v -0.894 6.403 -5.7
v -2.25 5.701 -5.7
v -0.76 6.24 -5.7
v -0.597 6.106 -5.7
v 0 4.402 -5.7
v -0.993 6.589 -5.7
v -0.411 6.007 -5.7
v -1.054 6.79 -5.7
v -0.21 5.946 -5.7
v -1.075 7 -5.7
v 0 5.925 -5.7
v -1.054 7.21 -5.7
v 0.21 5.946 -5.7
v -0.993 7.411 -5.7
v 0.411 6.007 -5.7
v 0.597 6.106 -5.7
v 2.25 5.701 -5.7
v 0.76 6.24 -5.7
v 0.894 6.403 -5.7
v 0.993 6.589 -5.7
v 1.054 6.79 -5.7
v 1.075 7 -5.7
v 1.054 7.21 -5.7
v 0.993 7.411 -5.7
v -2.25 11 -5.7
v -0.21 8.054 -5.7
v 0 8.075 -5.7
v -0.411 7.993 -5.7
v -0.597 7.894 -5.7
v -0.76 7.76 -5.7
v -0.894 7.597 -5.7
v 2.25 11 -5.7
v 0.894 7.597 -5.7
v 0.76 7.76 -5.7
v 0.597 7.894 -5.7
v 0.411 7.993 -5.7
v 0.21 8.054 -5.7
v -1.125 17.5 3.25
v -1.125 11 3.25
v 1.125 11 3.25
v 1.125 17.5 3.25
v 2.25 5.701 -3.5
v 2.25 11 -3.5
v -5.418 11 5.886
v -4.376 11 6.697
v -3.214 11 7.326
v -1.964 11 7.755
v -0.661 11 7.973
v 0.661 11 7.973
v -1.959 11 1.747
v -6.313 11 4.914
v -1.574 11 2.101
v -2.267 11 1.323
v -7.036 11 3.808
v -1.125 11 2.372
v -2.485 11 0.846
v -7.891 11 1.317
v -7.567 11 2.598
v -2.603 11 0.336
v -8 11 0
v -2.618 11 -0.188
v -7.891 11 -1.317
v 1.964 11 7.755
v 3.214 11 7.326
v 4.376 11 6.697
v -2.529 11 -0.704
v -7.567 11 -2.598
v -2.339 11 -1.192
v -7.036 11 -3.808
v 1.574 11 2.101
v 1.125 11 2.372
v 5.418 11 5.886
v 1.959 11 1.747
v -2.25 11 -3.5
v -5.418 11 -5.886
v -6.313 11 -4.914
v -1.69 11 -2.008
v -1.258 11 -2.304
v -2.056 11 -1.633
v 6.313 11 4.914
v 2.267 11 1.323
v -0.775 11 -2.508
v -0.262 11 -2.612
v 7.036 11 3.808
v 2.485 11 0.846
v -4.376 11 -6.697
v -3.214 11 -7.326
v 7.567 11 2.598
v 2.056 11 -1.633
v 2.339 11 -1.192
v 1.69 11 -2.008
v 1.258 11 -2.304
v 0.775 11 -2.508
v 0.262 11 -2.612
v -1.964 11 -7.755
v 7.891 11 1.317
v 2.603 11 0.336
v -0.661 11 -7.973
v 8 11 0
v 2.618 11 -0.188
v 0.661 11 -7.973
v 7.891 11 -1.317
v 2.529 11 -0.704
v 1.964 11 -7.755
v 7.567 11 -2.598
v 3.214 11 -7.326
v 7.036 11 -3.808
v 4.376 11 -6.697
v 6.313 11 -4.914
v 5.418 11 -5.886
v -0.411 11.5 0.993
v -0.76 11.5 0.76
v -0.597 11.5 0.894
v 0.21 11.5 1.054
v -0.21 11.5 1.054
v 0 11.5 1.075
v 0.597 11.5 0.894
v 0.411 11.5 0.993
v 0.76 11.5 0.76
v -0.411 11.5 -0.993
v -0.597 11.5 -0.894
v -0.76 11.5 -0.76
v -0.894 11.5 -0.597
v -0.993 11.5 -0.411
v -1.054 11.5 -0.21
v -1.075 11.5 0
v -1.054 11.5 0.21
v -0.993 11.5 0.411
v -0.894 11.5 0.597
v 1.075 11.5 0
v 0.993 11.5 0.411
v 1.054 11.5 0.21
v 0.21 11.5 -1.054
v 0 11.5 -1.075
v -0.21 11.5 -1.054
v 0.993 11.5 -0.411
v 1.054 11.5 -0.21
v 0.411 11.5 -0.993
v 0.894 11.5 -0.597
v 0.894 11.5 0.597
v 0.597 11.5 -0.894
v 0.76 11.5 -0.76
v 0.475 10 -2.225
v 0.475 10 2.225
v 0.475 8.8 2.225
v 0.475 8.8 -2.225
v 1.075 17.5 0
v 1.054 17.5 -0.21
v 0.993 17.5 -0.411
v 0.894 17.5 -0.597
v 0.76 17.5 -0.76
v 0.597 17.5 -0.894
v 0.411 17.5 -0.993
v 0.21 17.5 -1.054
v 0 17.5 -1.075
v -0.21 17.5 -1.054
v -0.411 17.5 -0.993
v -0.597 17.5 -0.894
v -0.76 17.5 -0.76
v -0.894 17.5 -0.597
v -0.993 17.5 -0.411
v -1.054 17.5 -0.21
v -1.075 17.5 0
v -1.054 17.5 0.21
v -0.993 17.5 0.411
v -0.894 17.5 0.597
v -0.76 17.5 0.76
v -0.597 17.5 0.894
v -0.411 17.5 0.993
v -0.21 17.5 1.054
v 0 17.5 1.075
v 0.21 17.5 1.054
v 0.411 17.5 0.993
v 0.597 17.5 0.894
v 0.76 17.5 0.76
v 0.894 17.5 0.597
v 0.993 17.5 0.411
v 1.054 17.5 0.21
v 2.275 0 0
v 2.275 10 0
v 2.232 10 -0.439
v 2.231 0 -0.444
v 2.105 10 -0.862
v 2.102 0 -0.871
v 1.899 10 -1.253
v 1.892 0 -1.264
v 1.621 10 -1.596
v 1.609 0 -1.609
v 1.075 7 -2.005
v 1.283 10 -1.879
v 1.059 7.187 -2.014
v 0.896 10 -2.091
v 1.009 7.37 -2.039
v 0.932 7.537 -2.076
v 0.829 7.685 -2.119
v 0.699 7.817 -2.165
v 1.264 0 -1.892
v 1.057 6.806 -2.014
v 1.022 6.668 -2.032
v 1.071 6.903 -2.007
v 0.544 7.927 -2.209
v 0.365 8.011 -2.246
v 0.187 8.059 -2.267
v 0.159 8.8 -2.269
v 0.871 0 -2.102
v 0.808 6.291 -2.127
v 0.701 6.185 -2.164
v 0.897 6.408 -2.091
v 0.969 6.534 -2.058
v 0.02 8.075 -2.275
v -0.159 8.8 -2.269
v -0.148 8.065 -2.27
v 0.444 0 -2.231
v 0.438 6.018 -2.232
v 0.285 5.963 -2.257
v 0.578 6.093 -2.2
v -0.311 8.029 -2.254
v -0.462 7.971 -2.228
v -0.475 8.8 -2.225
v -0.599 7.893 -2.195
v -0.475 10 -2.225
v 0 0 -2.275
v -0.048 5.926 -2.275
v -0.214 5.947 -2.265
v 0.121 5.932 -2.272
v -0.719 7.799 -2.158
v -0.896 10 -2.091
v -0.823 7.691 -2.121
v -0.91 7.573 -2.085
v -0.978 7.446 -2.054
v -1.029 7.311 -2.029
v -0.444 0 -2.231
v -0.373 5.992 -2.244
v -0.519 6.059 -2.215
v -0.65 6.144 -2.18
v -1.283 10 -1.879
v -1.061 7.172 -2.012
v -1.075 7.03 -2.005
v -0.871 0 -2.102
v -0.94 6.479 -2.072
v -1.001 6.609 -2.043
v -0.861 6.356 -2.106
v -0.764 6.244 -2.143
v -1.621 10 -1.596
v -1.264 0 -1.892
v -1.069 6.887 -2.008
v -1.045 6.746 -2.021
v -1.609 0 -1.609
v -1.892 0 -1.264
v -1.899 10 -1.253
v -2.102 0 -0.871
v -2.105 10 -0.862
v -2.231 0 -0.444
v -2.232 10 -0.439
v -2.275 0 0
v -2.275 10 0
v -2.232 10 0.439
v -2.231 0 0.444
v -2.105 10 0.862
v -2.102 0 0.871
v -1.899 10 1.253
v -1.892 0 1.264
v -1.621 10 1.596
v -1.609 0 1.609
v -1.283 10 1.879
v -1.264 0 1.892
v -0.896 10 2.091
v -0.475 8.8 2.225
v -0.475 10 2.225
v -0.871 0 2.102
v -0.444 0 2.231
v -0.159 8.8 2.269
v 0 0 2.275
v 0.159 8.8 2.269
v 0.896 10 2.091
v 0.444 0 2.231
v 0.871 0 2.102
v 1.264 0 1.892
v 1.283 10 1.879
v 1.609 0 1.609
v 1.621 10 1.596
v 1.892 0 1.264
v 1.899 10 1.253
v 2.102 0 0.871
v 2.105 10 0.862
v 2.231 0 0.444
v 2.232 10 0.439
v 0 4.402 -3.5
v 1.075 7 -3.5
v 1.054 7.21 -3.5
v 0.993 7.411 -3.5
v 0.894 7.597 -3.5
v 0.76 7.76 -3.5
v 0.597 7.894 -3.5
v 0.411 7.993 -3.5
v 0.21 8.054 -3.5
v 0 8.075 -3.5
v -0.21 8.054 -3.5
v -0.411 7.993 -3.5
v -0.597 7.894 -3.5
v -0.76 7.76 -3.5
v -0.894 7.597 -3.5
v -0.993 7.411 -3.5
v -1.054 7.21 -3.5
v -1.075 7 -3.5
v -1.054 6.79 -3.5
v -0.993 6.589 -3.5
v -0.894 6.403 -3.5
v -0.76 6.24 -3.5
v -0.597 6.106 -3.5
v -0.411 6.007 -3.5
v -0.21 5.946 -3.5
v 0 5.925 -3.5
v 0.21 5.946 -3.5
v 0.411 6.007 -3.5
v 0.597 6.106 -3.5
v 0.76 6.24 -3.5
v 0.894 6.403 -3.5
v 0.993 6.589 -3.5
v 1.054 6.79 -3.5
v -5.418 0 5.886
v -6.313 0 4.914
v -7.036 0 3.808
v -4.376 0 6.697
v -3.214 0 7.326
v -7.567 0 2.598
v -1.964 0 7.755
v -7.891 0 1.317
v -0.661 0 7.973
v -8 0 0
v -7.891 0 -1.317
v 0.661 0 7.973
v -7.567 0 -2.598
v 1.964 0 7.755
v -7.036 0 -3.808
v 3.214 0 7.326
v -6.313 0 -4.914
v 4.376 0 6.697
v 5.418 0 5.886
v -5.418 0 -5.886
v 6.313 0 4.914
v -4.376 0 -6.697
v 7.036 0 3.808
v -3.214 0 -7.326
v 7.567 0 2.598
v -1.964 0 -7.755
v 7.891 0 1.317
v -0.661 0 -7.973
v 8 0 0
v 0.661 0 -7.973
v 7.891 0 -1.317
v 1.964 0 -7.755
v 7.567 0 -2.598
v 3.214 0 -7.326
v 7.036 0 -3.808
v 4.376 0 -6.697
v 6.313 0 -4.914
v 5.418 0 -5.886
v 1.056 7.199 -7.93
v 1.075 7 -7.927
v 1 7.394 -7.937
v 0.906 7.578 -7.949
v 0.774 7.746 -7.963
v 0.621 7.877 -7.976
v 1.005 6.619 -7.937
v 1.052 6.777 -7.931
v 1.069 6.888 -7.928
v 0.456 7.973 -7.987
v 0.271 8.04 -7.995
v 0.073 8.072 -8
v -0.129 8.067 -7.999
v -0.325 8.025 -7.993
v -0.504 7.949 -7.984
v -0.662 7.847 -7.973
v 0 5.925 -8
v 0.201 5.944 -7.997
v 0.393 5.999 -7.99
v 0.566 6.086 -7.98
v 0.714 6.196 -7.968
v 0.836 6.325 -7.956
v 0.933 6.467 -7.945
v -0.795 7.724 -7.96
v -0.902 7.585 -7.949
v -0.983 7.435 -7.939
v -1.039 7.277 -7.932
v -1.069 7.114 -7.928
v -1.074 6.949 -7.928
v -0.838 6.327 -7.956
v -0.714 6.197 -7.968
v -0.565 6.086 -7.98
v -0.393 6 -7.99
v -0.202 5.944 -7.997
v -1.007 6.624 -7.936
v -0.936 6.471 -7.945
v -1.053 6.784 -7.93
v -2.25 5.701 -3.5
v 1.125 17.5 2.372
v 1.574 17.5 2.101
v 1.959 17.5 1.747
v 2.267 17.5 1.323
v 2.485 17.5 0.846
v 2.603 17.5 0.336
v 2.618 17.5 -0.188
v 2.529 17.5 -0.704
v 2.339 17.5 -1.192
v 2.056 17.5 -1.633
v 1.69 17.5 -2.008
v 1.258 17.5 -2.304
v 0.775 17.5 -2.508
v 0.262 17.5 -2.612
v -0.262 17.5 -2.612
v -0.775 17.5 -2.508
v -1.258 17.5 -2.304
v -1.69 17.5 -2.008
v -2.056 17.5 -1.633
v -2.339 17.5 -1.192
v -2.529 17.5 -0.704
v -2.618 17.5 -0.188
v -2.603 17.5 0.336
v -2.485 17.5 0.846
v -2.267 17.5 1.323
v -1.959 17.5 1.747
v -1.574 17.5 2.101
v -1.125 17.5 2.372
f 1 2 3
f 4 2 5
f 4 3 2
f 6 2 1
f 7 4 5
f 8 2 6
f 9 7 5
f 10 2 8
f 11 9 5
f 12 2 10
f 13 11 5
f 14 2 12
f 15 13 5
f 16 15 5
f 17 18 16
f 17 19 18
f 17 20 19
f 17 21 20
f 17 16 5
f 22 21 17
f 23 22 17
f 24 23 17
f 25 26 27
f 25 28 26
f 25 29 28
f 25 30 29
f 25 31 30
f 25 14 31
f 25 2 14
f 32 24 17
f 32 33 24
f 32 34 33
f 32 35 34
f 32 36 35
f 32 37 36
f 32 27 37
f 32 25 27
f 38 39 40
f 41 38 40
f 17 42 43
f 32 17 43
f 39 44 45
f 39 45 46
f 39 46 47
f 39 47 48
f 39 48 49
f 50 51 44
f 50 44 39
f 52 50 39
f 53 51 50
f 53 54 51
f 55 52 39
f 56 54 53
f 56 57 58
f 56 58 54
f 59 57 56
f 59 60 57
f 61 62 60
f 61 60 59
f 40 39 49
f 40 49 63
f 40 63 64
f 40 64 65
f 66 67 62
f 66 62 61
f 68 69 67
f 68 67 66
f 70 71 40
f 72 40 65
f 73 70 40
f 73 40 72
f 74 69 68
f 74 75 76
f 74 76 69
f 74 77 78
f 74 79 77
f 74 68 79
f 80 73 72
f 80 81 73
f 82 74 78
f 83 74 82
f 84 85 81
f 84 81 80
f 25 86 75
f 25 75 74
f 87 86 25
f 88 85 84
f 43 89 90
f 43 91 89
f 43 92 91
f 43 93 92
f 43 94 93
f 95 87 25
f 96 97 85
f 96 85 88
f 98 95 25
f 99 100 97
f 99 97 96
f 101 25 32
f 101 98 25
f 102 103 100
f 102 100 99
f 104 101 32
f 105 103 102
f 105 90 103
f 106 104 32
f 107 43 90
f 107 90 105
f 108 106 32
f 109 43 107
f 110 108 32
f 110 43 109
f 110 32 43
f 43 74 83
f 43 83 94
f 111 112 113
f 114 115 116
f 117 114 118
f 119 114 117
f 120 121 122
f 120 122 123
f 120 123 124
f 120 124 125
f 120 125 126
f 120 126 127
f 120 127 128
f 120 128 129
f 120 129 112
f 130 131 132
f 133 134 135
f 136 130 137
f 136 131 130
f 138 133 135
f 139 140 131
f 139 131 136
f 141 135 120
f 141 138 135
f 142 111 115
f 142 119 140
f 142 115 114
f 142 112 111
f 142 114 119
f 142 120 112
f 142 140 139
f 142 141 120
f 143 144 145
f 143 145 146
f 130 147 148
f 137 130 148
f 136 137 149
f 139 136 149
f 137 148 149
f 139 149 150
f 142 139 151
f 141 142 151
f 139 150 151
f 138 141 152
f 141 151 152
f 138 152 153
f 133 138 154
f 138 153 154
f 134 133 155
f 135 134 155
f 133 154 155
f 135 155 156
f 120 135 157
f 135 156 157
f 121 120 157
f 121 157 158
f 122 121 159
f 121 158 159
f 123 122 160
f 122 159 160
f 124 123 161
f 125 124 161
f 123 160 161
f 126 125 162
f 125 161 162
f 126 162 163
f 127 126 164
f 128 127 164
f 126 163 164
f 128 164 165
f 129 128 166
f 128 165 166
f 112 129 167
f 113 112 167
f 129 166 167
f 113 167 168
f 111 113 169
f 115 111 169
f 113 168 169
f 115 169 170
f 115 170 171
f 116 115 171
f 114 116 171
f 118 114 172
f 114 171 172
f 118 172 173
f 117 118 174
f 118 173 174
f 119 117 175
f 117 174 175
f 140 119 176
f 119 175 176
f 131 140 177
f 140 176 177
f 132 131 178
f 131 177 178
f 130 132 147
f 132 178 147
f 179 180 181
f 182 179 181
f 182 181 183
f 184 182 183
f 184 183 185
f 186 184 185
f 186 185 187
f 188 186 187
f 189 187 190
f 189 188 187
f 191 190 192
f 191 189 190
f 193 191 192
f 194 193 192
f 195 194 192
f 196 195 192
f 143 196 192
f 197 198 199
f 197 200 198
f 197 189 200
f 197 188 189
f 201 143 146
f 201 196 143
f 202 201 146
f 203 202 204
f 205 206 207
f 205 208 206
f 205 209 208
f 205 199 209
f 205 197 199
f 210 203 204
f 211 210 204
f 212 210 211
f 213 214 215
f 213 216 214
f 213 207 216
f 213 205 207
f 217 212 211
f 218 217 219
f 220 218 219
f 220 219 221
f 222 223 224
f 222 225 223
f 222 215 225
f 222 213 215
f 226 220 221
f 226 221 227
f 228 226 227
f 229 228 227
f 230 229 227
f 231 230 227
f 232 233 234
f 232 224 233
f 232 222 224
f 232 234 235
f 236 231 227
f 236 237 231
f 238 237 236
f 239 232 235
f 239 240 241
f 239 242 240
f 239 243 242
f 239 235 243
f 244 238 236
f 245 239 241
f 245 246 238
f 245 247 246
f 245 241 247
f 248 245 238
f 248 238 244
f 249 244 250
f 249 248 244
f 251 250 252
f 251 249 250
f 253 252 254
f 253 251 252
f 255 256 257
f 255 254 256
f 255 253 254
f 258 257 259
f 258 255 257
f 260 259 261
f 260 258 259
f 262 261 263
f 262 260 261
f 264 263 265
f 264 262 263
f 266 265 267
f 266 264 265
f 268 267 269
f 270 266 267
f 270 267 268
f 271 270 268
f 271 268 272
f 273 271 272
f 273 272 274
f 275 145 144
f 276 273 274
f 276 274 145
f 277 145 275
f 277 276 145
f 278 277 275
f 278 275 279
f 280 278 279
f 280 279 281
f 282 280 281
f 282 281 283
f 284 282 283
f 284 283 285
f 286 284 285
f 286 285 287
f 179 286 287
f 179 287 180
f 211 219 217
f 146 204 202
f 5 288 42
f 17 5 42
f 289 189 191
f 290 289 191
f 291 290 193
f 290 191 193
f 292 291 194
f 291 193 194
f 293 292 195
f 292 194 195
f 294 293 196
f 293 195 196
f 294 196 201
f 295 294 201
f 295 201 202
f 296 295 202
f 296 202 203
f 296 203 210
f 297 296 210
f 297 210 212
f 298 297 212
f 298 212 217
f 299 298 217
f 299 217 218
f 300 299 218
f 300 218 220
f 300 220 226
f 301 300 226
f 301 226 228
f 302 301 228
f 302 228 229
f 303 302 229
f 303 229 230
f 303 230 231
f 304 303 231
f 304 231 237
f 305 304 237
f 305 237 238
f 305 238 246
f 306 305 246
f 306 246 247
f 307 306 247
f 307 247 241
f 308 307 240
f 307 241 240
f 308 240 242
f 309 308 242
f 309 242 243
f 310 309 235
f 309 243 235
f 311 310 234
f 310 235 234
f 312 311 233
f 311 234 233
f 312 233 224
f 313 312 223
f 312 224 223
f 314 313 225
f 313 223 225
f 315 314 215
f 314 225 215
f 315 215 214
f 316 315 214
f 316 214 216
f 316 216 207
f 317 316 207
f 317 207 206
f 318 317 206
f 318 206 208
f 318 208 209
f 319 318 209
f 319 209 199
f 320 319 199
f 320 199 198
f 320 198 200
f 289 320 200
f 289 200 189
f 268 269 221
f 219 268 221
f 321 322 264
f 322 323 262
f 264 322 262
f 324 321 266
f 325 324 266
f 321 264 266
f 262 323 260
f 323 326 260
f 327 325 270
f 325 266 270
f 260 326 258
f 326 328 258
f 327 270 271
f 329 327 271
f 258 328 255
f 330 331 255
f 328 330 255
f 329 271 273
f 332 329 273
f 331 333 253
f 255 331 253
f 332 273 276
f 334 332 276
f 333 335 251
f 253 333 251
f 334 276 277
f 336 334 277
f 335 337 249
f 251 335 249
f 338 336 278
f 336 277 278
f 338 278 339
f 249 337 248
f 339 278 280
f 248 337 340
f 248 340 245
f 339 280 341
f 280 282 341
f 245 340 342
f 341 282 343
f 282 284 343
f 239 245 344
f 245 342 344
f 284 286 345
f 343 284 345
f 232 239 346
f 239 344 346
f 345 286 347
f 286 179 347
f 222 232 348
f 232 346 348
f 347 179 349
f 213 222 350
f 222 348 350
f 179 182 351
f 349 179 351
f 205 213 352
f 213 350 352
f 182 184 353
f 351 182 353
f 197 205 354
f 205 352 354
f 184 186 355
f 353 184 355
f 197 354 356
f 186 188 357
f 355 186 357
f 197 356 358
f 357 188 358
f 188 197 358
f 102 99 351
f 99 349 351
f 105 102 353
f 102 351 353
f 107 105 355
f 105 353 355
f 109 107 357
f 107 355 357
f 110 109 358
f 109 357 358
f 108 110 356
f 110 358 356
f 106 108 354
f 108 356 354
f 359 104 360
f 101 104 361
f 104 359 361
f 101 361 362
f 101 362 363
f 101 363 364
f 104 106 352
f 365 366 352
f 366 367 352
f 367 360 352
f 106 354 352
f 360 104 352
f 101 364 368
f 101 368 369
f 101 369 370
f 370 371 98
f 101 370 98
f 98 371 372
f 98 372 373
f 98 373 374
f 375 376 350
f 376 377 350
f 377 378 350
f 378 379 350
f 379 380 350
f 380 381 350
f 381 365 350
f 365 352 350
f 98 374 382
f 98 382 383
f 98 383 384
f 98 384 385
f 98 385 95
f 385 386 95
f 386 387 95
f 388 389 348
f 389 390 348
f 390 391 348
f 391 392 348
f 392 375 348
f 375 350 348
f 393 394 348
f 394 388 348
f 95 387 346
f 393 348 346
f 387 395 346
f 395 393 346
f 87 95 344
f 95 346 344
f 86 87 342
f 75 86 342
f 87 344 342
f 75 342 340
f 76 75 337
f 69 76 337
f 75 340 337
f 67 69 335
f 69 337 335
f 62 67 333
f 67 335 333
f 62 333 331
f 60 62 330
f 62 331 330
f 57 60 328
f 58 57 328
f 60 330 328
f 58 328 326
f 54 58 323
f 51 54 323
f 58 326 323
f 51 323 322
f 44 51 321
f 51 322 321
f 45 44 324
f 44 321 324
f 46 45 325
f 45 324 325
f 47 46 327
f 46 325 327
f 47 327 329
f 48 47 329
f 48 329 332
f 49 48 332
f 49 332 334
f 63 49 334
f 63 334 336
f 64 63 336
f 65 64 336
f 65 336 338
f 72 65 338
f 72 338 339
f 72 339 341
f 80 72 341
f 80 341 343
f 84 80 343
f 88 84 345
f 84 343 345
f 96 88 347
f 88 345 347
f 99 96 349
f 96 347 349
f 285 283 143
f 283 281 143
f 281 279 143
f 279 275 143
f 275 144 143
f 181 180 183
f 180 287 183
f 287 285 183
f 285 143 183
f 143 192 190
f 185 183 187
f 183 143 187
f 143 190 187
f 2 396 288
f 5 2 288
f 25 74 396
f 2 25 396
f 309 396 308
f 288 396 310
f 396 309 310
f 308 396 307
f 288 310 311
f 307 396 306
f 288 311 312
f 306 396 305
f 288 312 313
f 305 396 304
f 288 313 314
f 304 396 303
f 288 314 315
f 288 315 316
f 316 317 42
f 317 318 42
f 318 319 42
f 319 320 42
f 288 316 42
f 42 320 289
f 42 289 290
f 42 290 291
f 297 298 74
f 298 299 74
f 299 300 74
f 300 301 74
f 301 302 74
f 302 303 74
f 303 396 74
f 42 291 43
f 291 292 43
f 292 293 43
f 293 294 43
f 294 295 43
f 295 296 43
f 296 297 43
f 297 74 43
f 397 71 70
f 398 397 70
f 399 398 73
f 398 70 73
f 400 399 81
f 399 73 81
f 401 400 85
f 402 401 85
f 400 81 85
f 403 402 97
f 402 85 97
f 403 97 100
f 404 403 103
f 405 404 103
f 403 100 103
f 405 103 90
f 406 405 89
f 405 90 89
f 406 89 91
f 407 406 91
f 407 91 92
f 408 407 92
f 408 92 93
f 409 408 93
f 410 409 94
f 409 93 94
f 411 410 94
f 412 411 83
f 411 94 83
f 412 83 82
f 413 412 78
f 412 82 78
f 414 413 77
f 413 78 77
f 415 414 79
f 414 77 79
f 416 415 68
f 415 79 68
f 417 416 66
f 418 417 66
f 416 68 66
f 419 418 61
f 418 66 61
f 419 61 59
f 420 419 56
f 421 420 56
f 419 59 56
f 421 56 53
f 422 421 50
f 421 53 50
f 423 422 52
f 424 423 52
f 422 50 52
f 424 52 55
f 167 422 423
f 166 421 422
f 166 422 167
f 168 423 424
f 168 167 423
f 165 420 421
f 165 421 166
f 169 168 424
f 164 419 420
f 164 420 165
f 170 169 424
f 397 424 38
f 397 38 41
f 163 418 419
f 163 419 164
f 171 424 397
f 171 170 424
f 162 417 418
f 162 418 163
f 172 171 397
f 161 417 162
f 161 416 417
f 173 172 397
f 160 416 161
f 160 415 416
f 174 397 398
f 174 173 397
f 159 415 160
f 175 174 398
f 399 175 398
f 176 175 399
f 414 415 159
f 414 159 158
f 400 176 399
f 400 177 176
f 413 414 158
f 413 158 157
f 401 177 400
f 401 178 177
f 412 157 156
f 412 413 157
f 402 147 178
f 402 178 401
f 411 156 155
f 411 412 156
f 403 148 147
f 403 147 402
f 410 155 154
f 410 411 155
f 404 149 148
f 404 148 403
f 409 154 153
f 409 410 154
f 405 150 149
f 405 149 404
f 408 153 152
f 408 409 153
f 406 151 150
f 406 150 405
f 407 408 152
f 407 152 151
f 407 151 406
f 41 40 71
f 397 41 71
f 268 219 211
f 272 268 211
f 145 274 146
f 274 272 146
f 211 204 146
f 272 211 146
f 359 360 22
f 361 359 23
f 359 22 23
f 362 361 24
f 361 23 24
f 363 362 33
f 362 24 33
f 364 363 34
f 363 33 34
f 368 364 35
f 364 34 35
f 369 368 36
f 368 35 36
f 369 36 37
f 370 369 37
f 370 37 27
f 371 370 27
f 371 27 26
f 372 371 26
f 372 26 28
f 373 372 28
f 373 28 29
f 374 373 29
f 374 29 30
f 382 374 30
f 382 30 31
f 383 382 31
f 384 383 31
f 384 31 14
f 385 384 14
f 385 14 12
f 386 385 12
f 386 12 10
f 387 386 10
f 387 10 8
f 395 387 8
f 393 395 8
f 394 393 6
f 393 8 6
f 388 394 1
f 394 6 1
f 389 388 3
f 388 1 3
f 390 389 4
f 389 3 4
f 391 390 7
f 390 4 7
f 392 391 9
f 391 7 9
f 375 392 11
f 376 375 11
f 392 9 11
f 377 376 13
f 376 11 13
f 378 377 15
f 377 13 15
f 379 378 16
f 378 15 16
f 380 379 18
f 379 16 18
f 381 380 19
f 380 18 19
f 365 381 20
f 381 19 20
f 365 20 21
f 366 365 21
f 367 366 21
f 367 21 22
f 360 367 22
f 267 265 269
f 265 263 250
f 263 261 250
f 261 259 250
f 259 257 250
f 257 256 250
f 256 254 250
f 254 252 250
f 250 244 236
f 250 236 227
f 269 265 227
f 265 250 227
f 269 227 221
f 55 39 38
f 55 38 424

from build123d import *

# Parameters (mm, degrees)
SKETCH1_R           = 8
BOSS_EXTRUDE1_DEPTH = 10
SKETCH2_R           = 1.075
CUT_EXTRUDE1_DEPTH  = 9
SKETCH4_R           = 2.275
CUT_EXTRUDE4_DEPTH  = 11.0000001
SKETCH5_W           = 0.95
SKETCH5_H           = 7.069146706
BOSS_EXTRUDE2_DEPTH = 1.2
SKETCH7_R           = 8
BOSS_EXTRUDE3_DEPTH = 1
SKETCH8_R           = 2.625
SKETCH8_W           = 2.25
SKETCH8_H           = 1.25
BOSS_EXTRUDE4_DEPTH = 6.5
SKETCH9_R           = 1.075
CUT_EXTRUDE5_DEPTH  = 6
CUT_EXTRUDE2_START  = -3.5
CUT_EXTRUDE2_DEPTH  = 2.2


with BuildPart() as part:
    # Sketch1 → Boss-Extrude1 (new body)
    with BuildSketch(Plane(origin=(0, 0, 0), x_dir=(1, 0, 0), z_dir=(0, 1, 0))):
        Circle(SKETCH1_R)
    extrude(amount=BOSS_EXTRUDE1_DEPTH)

    # Sketch2 → Cut-Extrude1 (cut, through all)
    with BuildSketch(Plane.XY):
        with Locations((0, 7)):
            Circle(SKETCH2_R)
    extrude(amount=-CUT_EXTRUDE1_DEPTH, mode=Mode.SUBTRACT)

    # Sketch4 → Cut-Extrude4 (cut, through all)
    with BuildSketch(Plane(origin=(0, 0, 0), x_dir=(1, 0, 0), z_dir=(0, 1, 0))):
        Circle(SKETCH4_R)
    extrude(amount=CUT_EXTRUDE4_DEPTH, mode=Mode.SUBTRACT)

    # Sketch5 → Boss-Extrude2 (add)
    with BuildSketch(Plane(origin=(0, 10, 0), x_dir=(1, 0, 0), z_dir=(0, 1, 0))):
        Rectangle(SKETCH5_W, SKETCH5_H)
    extrude(amount=-BOSS_EXTRUDE2_DEPTH)

    # Sketch7 → Boss-Extrude3 (add)
    with BuildSketch(Plane(origin=(0, 10, 0), x_dir=(1, 0, 0), z_dir=(0, 1, 0))):
        Circle(SKETCH7_R)
    extrude(amount=BOSS_EXTRUDE3_DEPTH)

    # Sketch8 → Boss-Extrude4 (add)
    with BuildSketch(Plane(origin=(0, 11, 0), x_dir=(1, 0, 0), z_dir=(0, 1, 0))):
        Circle(SKETCH8_R)
        with Locations((0, -2.625)):
            Rectangle(SKETCH8_W, SKETCH8_H)
    extrude(amount=BOSS_EXTRUDE4_DEPTH)

    # Sketch9 → Cut-Extrude5 (cut)
    with BuildSketch(Plane(origin=(0, 17.5, 0), x_dir=(1, 0, 0), z_dir=(0, 1, 0))):
        Circle(SKETCH9_R)
    extrude(amount=-CUT_EXTRUDE5_DEPTH, mode=Mode.SUBTRACT)

    # Sketch3 → Cut-Extrude2 (cut)
    with BuildSketch(Plane.XY.offset(CUT_EXTRUDE2_START)):
        Polygon((0, 4.401923789), (2.25, 5.700961894), (2.25, 8.299038106), (2.25, 11.472802467), (-2.25, 11.472802467), (-2.25, 8.299038106), (-2.25, 5.700961894), align=None)
    extrude(amount=-CUT_EXTRUDE2_DEPTH, mode=Mode.SUBTRACT)


solid = part.part
